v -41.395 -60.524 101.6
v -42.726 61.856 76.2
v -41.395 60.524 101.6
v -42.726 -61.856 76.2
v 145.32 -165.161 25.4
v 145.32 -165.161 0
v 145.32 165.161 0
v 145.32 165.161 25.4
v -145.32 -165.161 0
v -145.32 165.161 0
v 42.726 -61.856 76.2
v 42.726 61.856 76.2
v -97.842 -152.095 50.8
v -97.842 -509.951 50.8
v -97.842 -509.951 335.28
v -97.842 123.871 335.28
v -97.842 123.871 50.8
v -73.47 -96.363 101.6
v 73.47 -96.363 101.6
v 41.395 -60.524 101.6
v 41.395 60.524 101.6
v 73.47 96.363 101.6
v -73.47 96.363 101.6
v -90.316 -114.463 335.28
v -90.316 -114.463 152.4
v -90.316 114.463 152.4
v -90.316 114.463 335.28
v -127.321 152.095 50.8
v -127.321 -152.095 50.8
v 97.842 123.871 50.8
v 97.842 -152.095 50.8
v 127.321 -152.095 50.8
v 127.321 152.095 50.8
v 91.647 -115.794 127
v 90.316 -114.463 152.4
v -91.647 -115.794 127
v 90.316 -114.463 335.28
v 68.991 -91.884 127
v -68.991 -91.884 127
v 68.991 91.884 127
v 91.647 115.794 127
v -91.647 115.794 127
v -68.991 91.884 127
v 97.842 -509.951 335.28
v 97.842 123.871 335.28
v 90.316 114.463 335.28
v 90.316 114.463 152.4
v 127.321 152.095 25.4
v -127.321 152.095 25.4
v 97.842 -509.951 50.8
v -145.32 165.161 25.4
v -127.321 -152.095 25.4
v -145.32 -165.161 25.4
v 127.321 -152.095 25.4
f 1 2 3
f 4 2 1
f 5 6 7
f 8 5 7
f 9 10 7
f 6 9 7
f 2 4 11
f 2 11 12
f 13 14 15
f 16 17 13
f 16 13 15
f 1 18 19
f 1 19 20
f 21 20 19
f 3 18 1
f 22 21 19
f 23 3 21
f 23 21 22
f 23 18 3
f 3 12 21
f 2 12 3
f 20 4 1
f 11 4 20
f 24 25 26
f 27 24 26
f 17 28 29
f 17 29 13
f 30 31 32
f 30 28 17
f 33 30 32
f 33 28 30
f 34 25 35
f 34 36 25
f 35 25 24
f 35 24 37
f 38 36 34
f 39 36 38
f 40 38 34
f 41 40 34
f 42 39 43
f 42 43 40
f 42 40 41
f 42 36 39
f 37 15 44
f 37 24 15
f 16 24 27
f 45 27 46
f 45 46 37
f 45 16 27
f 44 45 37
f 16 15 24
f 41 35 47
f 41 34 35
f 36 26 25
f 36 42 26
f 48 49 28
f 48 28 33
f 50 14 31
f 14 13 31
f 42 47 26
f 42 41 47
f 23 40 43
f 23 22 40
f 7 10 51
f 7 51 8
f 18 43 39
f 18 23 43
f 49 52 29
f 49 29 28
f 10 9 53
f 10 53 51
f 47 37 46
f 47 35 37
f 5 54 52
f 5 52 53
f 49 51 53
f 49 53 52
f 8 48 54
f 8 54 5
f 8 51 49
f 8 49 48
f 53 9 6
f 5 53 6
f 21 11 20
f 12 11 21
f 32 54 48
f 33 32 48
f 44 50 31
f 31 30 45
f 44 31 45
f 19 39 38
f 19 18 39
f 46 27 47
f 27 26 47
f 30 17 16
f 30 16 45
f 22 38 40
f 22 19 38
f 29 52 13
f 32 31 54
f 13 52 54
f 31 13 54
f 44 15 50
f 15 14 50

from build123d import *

# Parameters (mm, degrees)
F0_W      = 290.640860796
F0_H      = 330.3228616714
F1_DEPTH  = 25.4
F2_W      = 254.641264677
F2_H      = 304.1897118092
F3_DEPTH  = 25.4
F4_W      = 195.6849247217
F4_H      = 247.7421462536
F5_DEPTH  = 101.6
F6_W      = 180.6322485209
F6_H      = 228.9262861013
F7_DEPTH  = 25.4
F7_TAPER  = -3
F8_W      = 137.9829794168
F8_H      = 183.7682276964
F9_DEPTH  = 25.4
F9_TAPER  = -10
F10_W     = 82.7897712588
F10_H     = 121.0486963391
F11_DEPTH = 25.4
F11_TAPER = -3
F12_DEPTH = 132.08
F13_DEPTH = 99.06
F14_DEPTH = 83.82
F15_DEPTH = 254


with BuildPart() as f1:
    # F0 (on Top) → F1 (new body)
    with BuildSketch(Plane.XY):
        Rectangle(F0_W, F0_H)
    extrude(amount=F1_DEPTH)

    # F2 (on face) → F3 (join)
    with BuildSketch(Plane.XY.offset(25.4)):
        Rectangle(F2_W, F2_H)
    extrude(amount=F3_DEPTH)

    # F4 (on face) → F5 (join)
    with BuildSketch(Plane.XY.offset(50.8)):
        Rectangle(F4_W, F4_H)
    extrude(amount=F5_DEPTH)

    # F6 (on face) → F7 (cut)
    with BuildSketch(Plane.XY.offset(152.4)):
        Rectangle(F6_W, F6_H)
    extrude(amount=-F7_DEPTH, taper=F7_TAPER, mode=Mode.SUBTRACT)

    # F8 (on face) → F9 (cut)
    with BuildSketch(Plane.XY.offset(127)):
        Rectangle(F8_W, F8_H)
    extrude(amount=-F9_DEPTH, taper=F9_TAPER, mode=Mode.SUBTRACT)

    # F10 (on face) → F11 (cut)
    with BuildSketch(Plane.XY.offset(101.6)):
        Rectangle(F10_W, F10_H)
    extrude(amount=-F11_DEPTH, taper=F11_TAPER, mode=Mode.SUBTRACT)

    # F12 (add): a face of the model
    f12_faces = [f1.faces().sort_by_distance(p)[0] for p in [
        (0, -123.8710731268, 101.6),
    ]]
    extrude(f12_faces, amount=F12_DEPTH)

    # F13 (add): a face of the model
    f13_faces = [f1.faces().sort_by_distance(p)[0] for p in [
        (0, -148.8583176808, 152.4),
    ]]
    extrude(f13_faces, amount=F13_DEPTH)

    # F14 (add): a face of the model
    f14_faces = [f1.faces().sort_by_distance(p)[0] for p in [
        (0, -148.8583176808, 251.46),
    ]]
    extrude(f14_faces, amount=F14_DEPTH)

    # F15 (add): a face of the model
    f15_faces = [f1.faces().sort_by_distance(p)[0] for p in [
        (0, -255.9510731268, 193.04),
    ]]
    extrude(f15_faces, amount=F15_DEPTH)


solid = f1.part
